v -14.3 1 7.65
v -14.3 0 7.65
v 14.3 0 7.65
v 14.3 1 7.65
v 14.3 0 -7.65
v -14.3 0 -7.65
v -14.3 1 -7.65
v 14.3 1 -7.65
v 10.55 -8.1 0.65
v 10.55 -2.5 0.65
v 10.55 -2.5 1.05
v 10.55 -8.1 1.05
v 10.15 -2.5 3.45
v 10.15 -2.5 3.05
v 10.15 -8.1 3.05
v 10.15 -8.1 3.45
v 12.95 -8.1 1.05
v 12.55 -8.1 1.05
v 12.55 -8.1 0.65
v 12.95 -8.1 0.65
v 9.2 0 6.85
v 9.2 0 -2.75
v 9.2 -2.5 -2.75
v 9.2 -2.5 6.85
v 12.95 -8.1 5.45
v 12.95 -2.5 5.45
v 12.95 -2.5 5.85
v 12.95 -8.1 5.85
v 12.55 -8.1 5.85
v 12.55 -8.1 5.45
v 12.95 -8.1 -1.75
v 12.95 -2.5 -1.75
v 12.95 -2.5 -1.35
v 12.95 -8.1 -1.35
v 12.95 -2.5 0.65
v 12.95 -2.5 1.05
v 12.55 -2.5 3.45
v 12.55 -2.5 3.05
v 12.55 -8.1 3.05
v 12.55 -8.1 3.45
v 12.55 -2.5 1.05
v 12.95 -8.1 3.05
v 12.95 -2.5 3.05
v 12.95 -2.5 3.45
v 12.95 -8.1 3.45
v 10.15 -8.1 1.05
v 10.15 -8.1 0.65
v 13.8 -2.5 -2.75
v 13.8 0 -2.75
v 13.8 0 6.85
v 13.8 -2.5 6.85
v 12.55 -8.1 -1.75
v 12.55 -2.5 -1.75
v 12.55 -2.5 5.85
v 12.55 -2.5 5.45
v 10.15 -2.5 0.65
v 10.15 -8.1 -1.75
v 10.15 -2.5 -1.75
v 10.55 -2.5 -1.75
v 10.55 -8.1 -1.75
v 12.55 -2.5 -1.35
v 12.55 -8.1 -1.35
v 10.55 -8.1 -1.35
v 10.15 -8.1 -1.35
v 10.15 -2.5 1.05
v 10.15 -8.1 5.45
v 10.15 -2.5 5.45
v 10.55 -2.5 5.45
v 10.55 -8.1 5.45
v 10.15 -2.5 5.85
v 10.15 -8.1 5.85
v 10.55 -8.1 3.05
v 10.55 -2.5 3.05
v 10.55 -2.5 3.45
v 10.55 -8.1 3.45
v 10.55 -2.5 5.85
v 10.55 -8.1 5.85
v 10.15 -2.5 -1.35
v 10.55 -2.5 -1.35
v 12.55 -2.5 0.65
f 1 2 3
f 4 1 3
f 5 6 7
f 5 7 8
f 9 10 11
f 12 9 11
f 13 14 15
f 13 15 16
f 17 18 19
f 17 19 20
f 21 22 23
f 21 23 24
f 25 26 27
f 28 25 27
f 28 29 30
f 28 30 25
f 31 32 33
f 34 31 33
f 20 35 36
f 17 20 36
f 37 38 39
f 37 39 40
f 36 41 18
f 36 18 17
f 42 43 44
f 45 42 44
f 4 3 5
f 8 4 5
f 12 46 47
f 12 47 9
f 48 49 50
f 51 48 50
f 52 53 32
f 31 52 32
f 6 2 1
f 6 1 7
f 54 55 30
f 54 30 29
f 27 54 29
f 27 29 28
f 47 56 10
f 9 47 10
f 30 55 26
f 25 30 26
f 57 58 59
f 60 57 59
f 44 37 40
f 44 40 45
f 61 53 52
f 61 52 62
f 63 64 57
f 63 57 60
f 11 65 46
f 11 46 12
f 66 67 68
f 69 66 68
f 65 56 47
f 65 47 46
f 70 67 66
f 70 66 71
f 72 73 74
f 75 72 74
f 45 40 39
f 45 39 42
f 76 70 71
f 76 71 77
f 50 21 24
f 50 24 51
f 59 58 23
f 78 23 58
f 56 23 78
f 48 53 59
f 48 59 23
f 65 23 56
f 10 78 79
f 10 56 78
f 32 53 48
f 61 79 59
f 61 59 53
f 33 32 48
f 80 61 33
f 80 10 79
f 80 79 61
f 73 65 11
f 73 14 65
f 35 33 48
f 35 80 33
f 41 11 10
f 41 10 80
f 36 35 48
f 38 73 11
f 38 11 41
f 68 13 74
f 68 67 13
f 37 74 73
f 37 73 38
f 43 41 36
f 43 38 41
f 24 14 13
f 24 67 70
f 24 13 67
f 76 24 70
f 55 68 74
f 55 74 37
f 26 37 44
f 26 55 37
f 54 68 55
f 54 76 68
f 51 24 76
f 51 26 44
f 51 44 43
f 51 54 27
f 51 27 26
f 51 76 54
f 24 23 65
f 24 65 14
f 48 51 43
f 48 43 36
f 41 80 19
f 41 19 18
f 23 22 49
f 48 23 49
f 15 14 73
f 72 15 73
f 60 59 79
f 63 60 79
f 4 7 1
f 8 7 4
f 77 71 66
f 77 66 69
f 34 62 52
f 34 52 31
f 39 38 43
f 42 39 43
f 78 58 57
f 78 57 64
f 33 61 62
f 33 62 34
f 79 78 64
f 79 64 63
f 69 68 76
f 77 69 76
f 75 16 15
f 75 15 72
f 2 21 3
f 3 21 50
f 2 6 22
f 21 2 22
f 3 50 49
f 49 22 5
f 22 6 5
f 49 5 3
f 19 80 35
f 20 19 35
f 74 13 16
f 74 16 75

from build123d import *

# Parameters (mm, degrees)
SKETCH_1_W      = 28.6
SKETCH_1_H      = 15.3
EXTRUDE_1_DEPTH = 1
SKETCH_2_W      = 4.6
SKETCH_2_H      = 9.6
EXTRUDE_2_DEPTH = 2.5
SKETCH_3_W      = 0.4
SKETCH_3_H      = 0.4
EXTRUDE_3_DEPTH = 5.6


with BuildPart() as part:
    # 草图1 → 凸台-拉伸1 (new body)
    with BuildSketch(Plane(origin=(0, 0, 0), x_dir=(1, 0, 0), z_dir=(0, 1, 0))):
        Rectangle(SKETCH_1_W, SKETCH_1_H)
    extrude(amount=EXTRUDE_1_DEPTH)

    # 草图2 → 凸台-拉伸2 (add)
    with BuildSketch(Plane.XZ):
        with Locations((11.5, 2.05)):
            Rectangle(SKETCH_2_W, SKETCH_2_H)
    extrude(amount=EXTRUDE_2_DEPTH)

    # 草图3 → 凸台-拉伸3 (add)
    with BuildSketch(Plane.XZ.offset(2.5)):
        with Locations((12.75, 5.65)):
            Rectangle(SKETCH_3_W, SKETCH_3_H)
        with Locations((10.35, 5.65)):
            Rectangle(SKETCH_3_W, SKETCH_3_H)
        with Locations((12.75, 3.25)):
            Rectangle(SKETCH_3_W, SKETCH_3_H)
        with Locations((12.75, 0.85)):
            Rectangle(SKETCH_3_W, SKETCH_3_H)
        with Locations((12.75, -1.55)):
            Rectangle(SKETCH_3_W, SKETCH_3_H)
        with Locations((10.35, 3.25)):
            Rectangle(SKETCH_3_W, SKETCH_3_H)
        with Locations((10.35, 0.85)):
            Rectangle(SKETCH_3_W, SKETCH_3_H)
        with Locations((10.35, -1.55)):
            Rectangle(SKETCH_3_W, SKETCH_3_H)
    extrude(amount=EXTRUDE_3_DEPTH)


solid = part.part
